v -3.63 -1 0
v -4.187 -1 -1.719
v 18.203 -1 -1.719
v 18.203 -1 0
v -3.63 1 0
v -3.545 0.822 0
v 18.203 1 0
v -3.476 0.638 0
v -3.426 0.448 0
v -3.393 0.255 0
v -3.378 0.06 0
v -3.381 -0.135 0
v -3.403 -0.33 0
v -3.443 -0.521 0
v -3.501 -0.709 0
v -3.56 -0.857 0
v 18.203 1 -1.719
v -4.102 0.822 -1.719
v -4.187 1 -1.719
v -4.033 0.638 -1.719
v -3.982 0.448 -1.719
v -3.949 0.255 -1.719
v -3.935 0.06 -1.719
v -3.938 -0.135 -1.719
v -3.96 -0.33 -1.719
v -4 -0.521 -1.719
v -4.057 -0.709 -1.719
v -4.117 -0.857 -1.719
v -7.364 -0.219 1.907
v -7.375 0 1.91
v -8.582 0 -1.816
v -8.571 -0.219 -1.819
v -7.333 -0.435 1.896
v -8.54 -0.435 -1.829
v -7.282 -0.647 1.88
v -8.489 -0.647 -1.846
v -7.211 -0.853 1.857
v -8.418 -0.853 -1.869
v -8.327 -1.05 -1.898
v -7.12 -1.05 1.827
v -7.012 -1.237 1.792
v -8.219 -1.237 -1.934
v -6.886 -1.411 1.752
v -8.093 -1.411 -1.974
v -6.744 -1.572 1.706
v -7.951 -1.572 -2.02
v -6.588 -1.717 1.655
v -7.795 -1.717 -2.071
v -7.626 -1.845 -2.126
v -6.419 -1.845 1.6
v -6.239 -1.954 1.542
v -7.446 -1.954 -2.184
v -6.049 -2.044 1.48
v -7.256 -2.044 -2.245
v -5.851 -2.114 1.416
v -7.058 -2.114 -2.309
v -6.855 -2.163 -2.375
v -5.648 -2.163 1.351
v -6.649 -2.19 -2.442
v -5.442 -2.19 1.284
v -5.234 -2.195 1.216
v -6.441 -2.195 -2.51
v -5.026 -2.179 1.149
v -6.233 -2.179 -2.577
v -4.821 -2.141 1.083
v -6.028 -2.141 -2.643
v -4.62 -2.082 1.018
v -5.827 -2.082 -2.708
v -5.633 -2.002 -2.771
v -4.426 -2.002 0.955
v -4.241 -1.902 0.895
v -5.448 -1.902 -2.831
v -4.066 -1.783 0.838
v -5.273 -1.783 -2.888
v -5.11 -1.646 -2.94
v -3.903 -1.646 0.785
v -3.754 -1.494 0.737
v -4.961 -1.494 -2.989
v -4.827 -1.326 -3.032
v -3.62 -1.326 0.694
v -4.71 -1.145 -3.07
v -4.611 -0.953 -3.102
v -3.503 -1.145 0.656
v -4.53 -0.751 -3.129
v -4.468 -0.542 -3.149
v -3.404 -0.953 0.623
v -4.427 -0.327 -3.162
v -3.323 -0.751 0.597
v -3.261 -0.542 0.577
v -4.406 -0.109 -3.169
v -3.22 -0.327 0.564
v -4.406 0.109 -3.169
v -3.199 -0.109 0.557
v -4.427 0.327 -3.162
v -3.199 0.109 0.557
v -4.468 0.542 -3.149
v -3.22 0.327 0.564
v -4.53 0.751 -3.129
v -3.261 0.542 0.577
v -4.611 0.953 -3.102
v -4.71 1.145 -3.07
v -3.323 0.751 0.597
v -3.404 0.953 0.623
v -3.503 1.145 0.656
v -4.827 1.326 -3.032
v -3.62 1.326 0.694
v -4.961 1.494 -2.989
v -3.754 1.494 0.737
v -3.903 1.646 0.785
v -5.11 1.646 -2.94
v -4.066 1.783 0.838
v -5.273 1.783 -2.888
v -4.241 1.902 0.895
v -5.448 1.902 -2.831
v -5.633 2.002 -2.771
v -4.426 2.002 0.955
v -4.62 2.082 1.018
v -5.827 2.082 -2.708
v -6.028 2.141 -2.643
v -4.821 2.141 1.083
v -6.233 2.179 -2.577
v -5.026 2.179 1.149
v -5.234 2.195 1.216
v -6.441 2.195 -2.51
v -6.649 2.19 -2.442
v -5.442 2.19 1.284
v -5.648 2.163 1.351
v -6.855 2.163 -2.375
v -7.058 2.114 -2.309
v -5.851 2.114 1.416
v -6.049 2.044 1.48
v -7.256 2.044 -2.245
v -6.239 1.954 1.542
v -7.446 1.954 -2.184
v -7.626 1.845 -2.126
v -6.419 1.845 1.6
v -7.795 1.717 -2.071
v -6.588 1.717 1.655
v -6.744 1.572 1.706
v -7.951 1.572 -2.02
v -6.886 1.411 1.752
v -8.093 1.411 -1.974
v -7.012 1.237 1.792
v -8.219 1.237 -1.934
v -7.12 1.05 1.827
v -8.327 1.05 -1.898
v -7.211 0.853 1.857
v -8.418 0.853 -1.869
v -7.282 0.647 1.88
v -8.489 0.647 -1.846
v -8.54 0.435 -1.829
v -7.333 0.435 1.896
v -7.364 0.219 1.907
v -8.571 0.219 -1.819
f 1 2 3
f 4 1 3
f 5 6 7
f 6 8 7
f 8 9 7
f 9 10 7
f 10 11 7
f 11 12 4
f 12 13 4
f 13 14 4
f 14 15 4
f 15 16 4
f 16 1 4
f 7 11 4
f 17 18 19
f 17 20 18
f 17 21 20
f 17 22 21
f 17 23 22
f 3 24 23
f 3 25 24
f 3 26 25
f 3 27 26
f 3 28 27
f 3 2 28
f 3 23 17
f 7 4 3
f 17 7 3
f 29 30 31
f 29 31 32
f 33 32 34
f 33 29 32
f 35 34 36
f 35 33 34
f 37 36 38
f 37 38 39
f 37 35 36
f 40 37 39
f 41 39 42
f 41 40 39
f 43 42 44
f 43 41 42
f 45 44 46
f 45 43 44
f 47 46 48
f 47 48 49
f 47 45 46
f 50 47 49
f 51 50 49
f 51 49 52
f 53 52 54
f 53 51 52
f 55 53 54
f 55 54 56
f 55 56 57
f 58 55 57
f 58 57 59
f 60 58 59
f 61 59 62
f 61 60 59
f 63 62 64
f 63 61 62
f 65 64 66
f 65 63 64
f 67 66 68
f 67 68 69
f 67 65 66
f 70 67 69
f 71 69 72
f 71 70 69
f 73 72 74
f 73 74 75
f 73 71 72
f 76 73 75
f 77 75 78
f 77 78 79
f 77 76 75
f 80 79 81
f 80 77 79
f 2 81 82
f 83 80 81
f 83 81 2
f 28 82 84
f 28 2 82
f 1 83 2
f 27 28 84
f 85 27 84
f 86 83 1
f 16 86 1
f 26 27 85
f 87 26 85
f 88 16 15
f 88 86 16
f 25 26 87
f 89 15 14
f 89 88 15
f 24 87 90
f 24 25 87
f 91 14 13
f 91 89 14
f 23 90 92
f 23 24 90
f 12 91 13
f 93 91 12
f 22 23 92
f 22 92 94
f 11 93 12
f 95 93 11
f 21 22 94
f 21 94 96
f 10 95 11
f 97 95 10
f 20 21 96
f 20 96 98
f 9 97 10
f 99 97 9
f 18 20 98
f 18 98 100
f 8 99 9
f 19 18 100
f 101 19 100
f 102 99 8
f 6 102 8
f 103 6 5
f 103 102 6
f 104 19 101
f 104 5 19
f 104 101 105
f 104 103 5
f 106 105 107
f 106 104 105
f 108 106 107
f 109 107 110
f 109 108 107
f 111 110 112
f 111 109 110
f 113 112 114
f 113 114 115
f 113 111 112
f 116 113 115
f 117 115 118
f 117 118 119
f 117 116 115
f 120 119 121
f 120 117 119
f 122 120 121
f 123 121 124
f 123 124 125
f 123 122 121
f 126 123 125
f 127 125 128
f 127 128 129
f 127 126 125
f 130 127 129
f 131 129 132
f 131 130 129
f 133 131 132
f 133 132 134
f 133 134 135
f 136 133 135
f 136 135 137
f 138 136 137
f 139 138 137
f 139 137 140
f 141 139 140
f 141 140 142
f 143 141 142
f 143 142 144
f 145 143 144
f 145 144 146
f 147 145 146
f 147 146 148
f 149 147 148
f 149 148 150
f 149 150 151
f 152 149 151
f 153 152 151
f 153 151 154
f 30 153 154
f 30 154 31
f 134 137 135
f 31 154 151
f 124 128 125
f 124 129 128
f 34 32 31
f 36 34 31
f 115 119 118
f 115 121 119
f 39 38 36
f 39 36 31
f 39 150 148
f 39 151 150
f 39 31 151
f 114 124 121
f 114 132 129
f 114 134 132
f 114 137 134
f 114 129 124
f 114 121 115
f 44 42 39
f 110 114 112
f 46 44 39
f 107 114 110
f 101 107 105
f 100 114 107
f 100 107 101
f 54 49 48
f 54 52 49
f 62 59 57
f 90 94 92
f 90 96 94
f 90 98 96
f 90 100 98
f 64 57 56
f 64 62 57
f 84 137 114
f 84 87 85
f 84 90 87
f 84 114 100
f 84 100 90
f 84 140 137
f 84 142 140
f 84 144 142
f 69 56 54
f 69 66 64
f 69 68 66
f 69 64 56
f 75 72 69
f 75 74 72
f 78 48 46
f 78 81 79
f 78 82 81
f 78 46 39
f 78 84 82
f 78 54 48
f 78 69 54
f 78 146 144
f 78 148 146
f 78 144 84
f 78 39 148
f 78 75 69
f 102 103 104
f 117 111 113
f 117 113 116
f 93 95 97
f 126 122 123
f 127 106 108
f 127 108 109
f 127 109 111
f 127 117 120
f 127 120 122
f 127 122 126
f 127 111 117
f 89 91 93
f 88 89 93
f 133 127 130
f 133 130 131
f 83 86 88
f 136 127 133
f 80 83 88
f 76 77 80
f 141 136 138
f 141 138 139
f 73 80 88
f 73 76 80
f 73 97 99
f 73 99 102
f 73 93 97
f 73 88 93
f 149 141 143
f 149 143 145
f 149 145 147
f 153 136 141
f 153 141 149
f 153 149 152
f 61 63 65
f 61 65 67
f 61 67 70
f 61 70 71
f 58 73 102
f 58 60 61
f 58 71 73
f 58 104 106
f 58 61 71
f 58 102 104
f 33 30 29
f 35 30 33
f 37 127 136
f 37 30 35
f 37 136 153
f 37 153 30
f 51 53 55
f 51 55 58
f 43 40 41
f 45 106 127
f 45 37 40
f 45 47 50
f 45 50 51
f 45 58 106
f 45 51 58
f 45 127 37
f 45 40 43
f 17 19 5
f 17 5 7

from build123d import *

# Parameters (mm, degrees)
SALIENTE_EXTRUIR1_DEPTH      = 1
SALIENTE_EXTRUIR1_DEPTH_BACK = 1
CROQUIS1_W                   = 25
CROQUIS1_H                   = 1.71875


with BuildPart() as part:
    # Croquis1 → Saliente-Extruir1 (new, two sides: drawn at the far end of the back side and taken through both)
    with BuildSketch(Plane(origin=(0, 0, 0), x_dir=(1, 0, 0), z_dir=(0, 1, 0)).offset(-SALIENTE_EXTRUIR1_DEPTH_BACK)):
        with Locations((5.703125, 0.859375)):
            Rectangle(CROQUIS1_W, CROQUIS1_H)
    extrude(amount=SALIENTE_EXTRUIR1_DEPTH + SALIENTE_EXTRUIR1_DEPTH_BACK)

    # Croquis2 → Revolución1 (revolve)
    with BuildSketch(Plane(origin=(0, 0, 0), x_dir=(1, 0, 0), z_dir=(0, 1, 0))):
        Polygon((-6.49264348, 2.492708525), (-8.58165548, 1.815986328), (-7.37467758, -1.909901974), (-5.285665579, -1.233179777), align=None)
    revolve(axis=Axis((-6.615873756, 0, -2.873115032), (0.3081770108524537, 0, 0.9513290335010526)))


solid = part.part
